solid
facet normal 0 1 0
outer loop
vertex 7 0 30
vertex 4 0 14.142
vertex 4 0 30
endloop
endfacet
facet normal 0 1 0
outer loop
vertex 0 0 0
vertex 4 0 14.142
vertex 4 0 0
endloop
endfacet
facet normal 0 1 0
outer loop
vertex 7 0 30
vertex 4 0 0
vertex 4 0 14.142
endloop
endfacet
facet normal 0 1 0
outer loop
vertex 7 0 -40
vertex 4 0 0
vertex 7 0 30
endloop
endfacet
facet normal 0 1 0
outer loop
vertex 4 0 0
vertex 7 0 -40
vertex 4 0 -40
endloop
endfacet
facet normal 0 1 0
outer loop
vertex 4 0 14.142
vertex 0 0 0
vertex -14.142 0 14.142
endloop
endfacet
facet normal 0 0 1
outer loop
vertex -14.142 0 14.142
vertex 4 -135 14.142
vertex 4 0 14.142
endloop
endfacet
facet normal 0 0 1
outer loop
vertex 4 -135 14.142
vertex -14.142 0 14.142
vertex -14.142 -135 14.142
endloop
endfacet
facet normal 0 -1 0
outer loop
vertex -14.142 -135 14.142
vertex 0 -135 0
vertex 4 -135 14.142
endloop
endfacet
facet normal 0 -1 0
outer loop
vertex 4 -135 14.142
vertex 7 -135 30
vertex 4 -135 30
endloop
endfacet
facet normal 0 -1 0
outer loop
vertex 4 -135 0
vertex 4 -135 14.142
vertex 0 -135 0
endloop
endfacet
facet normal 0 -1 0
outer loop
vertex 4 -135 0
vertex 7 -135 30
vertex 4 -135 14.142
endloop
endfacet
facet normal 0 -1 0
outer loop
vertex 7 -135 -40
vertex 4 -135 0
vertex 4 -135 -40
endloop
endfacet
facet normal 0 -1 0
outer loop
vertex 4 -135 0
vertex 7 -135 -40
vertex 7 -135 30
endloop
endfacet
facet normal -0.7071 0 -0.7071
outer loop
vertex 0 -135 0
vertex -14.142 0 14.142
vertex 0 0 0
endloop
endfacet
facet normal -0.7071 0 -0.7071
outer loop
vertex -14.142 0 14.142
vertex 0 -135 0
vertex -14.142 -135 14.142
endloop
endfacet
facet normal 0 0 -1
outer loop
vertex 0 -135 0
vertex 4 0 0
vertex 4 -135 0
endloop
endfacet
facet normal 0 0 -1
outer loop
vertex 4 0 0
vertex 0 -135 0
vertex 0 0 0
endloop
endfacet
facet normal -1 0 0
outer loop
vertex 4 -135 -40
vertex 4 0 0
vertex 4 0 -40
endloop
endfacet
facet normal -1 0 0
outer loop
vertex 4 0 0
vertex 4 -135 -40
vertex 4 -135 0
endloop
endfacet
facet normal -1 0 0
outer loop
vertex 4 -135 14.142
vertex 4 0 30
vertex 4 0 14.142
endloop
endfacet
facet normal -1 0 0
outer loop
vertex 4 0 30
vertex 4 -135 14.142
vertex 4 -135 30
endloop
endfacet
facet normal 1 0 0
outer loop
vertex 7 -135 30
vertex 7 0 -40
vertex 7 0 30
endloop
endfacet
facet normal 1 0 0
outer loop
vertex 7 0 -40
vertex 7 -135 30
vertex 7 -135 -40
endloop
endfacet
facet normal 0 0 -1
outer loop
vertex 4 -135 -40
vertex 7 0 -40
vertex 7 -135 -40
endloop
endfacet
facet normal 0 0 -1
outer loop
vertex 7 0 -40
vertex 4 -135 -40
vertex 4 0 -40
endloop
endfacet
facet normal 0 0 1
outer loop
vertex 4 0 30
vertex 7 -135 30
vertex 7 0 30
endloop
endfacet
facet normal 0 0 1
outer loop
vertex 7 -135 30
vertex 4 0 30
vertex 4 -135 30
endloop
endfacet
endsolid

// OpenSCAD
// Einstellbare Parameter
winkel = 45; // Winkel in Grad
hypotenuse = 20; // Feste Hypotenuse
laenge = 135; // Tiefe des Dreiecks
abstand = 4;
screen_hoehe = 70;
screen_dicke = 3;

// Berechnungen basierend auf dem Winkel
winkel_rad = winkel * PI / 180; // Winkel in Radianten umwandeln
dreieck_hoehe = hypotenuse * sin(winkel); // Höhe des Dreiecks berechnen
basis = hypotenuse * cos(winkel); // Basis berechnen, wenn Hypotenuse fest ist

screen_pos_x = 0;
screen_pos_y = -screen_dicke-abstand;
screen_pos_z = -40;

screen_rot_x = 0;
screen_rot_y = 0;
screen_rot_z = 90;

rotate([90, -90, 0])
union() {
    // Grunddreieck
    linear_extrude(height = laenge)
    polygon(points=[
        [0, 0],
        [basis, 0],
        [basis, dreieck_hoehe]
    ]);
    
    // Verdickung an der Basis
    translate([0, -abstand, 0])
    cube([basis, abstand, laenge]);
    
    // Screen - mit dem Offset direkt in der translate-Anweisung
    translate([screen_pos_z + screen_hoehe, screen_pos_y, screen_pos_x])
    rotate([screen_rot_x, screen_rot_y, screen_rot_z])
    cube([screen_dicke, screen_hoehe, laenge]);
}
